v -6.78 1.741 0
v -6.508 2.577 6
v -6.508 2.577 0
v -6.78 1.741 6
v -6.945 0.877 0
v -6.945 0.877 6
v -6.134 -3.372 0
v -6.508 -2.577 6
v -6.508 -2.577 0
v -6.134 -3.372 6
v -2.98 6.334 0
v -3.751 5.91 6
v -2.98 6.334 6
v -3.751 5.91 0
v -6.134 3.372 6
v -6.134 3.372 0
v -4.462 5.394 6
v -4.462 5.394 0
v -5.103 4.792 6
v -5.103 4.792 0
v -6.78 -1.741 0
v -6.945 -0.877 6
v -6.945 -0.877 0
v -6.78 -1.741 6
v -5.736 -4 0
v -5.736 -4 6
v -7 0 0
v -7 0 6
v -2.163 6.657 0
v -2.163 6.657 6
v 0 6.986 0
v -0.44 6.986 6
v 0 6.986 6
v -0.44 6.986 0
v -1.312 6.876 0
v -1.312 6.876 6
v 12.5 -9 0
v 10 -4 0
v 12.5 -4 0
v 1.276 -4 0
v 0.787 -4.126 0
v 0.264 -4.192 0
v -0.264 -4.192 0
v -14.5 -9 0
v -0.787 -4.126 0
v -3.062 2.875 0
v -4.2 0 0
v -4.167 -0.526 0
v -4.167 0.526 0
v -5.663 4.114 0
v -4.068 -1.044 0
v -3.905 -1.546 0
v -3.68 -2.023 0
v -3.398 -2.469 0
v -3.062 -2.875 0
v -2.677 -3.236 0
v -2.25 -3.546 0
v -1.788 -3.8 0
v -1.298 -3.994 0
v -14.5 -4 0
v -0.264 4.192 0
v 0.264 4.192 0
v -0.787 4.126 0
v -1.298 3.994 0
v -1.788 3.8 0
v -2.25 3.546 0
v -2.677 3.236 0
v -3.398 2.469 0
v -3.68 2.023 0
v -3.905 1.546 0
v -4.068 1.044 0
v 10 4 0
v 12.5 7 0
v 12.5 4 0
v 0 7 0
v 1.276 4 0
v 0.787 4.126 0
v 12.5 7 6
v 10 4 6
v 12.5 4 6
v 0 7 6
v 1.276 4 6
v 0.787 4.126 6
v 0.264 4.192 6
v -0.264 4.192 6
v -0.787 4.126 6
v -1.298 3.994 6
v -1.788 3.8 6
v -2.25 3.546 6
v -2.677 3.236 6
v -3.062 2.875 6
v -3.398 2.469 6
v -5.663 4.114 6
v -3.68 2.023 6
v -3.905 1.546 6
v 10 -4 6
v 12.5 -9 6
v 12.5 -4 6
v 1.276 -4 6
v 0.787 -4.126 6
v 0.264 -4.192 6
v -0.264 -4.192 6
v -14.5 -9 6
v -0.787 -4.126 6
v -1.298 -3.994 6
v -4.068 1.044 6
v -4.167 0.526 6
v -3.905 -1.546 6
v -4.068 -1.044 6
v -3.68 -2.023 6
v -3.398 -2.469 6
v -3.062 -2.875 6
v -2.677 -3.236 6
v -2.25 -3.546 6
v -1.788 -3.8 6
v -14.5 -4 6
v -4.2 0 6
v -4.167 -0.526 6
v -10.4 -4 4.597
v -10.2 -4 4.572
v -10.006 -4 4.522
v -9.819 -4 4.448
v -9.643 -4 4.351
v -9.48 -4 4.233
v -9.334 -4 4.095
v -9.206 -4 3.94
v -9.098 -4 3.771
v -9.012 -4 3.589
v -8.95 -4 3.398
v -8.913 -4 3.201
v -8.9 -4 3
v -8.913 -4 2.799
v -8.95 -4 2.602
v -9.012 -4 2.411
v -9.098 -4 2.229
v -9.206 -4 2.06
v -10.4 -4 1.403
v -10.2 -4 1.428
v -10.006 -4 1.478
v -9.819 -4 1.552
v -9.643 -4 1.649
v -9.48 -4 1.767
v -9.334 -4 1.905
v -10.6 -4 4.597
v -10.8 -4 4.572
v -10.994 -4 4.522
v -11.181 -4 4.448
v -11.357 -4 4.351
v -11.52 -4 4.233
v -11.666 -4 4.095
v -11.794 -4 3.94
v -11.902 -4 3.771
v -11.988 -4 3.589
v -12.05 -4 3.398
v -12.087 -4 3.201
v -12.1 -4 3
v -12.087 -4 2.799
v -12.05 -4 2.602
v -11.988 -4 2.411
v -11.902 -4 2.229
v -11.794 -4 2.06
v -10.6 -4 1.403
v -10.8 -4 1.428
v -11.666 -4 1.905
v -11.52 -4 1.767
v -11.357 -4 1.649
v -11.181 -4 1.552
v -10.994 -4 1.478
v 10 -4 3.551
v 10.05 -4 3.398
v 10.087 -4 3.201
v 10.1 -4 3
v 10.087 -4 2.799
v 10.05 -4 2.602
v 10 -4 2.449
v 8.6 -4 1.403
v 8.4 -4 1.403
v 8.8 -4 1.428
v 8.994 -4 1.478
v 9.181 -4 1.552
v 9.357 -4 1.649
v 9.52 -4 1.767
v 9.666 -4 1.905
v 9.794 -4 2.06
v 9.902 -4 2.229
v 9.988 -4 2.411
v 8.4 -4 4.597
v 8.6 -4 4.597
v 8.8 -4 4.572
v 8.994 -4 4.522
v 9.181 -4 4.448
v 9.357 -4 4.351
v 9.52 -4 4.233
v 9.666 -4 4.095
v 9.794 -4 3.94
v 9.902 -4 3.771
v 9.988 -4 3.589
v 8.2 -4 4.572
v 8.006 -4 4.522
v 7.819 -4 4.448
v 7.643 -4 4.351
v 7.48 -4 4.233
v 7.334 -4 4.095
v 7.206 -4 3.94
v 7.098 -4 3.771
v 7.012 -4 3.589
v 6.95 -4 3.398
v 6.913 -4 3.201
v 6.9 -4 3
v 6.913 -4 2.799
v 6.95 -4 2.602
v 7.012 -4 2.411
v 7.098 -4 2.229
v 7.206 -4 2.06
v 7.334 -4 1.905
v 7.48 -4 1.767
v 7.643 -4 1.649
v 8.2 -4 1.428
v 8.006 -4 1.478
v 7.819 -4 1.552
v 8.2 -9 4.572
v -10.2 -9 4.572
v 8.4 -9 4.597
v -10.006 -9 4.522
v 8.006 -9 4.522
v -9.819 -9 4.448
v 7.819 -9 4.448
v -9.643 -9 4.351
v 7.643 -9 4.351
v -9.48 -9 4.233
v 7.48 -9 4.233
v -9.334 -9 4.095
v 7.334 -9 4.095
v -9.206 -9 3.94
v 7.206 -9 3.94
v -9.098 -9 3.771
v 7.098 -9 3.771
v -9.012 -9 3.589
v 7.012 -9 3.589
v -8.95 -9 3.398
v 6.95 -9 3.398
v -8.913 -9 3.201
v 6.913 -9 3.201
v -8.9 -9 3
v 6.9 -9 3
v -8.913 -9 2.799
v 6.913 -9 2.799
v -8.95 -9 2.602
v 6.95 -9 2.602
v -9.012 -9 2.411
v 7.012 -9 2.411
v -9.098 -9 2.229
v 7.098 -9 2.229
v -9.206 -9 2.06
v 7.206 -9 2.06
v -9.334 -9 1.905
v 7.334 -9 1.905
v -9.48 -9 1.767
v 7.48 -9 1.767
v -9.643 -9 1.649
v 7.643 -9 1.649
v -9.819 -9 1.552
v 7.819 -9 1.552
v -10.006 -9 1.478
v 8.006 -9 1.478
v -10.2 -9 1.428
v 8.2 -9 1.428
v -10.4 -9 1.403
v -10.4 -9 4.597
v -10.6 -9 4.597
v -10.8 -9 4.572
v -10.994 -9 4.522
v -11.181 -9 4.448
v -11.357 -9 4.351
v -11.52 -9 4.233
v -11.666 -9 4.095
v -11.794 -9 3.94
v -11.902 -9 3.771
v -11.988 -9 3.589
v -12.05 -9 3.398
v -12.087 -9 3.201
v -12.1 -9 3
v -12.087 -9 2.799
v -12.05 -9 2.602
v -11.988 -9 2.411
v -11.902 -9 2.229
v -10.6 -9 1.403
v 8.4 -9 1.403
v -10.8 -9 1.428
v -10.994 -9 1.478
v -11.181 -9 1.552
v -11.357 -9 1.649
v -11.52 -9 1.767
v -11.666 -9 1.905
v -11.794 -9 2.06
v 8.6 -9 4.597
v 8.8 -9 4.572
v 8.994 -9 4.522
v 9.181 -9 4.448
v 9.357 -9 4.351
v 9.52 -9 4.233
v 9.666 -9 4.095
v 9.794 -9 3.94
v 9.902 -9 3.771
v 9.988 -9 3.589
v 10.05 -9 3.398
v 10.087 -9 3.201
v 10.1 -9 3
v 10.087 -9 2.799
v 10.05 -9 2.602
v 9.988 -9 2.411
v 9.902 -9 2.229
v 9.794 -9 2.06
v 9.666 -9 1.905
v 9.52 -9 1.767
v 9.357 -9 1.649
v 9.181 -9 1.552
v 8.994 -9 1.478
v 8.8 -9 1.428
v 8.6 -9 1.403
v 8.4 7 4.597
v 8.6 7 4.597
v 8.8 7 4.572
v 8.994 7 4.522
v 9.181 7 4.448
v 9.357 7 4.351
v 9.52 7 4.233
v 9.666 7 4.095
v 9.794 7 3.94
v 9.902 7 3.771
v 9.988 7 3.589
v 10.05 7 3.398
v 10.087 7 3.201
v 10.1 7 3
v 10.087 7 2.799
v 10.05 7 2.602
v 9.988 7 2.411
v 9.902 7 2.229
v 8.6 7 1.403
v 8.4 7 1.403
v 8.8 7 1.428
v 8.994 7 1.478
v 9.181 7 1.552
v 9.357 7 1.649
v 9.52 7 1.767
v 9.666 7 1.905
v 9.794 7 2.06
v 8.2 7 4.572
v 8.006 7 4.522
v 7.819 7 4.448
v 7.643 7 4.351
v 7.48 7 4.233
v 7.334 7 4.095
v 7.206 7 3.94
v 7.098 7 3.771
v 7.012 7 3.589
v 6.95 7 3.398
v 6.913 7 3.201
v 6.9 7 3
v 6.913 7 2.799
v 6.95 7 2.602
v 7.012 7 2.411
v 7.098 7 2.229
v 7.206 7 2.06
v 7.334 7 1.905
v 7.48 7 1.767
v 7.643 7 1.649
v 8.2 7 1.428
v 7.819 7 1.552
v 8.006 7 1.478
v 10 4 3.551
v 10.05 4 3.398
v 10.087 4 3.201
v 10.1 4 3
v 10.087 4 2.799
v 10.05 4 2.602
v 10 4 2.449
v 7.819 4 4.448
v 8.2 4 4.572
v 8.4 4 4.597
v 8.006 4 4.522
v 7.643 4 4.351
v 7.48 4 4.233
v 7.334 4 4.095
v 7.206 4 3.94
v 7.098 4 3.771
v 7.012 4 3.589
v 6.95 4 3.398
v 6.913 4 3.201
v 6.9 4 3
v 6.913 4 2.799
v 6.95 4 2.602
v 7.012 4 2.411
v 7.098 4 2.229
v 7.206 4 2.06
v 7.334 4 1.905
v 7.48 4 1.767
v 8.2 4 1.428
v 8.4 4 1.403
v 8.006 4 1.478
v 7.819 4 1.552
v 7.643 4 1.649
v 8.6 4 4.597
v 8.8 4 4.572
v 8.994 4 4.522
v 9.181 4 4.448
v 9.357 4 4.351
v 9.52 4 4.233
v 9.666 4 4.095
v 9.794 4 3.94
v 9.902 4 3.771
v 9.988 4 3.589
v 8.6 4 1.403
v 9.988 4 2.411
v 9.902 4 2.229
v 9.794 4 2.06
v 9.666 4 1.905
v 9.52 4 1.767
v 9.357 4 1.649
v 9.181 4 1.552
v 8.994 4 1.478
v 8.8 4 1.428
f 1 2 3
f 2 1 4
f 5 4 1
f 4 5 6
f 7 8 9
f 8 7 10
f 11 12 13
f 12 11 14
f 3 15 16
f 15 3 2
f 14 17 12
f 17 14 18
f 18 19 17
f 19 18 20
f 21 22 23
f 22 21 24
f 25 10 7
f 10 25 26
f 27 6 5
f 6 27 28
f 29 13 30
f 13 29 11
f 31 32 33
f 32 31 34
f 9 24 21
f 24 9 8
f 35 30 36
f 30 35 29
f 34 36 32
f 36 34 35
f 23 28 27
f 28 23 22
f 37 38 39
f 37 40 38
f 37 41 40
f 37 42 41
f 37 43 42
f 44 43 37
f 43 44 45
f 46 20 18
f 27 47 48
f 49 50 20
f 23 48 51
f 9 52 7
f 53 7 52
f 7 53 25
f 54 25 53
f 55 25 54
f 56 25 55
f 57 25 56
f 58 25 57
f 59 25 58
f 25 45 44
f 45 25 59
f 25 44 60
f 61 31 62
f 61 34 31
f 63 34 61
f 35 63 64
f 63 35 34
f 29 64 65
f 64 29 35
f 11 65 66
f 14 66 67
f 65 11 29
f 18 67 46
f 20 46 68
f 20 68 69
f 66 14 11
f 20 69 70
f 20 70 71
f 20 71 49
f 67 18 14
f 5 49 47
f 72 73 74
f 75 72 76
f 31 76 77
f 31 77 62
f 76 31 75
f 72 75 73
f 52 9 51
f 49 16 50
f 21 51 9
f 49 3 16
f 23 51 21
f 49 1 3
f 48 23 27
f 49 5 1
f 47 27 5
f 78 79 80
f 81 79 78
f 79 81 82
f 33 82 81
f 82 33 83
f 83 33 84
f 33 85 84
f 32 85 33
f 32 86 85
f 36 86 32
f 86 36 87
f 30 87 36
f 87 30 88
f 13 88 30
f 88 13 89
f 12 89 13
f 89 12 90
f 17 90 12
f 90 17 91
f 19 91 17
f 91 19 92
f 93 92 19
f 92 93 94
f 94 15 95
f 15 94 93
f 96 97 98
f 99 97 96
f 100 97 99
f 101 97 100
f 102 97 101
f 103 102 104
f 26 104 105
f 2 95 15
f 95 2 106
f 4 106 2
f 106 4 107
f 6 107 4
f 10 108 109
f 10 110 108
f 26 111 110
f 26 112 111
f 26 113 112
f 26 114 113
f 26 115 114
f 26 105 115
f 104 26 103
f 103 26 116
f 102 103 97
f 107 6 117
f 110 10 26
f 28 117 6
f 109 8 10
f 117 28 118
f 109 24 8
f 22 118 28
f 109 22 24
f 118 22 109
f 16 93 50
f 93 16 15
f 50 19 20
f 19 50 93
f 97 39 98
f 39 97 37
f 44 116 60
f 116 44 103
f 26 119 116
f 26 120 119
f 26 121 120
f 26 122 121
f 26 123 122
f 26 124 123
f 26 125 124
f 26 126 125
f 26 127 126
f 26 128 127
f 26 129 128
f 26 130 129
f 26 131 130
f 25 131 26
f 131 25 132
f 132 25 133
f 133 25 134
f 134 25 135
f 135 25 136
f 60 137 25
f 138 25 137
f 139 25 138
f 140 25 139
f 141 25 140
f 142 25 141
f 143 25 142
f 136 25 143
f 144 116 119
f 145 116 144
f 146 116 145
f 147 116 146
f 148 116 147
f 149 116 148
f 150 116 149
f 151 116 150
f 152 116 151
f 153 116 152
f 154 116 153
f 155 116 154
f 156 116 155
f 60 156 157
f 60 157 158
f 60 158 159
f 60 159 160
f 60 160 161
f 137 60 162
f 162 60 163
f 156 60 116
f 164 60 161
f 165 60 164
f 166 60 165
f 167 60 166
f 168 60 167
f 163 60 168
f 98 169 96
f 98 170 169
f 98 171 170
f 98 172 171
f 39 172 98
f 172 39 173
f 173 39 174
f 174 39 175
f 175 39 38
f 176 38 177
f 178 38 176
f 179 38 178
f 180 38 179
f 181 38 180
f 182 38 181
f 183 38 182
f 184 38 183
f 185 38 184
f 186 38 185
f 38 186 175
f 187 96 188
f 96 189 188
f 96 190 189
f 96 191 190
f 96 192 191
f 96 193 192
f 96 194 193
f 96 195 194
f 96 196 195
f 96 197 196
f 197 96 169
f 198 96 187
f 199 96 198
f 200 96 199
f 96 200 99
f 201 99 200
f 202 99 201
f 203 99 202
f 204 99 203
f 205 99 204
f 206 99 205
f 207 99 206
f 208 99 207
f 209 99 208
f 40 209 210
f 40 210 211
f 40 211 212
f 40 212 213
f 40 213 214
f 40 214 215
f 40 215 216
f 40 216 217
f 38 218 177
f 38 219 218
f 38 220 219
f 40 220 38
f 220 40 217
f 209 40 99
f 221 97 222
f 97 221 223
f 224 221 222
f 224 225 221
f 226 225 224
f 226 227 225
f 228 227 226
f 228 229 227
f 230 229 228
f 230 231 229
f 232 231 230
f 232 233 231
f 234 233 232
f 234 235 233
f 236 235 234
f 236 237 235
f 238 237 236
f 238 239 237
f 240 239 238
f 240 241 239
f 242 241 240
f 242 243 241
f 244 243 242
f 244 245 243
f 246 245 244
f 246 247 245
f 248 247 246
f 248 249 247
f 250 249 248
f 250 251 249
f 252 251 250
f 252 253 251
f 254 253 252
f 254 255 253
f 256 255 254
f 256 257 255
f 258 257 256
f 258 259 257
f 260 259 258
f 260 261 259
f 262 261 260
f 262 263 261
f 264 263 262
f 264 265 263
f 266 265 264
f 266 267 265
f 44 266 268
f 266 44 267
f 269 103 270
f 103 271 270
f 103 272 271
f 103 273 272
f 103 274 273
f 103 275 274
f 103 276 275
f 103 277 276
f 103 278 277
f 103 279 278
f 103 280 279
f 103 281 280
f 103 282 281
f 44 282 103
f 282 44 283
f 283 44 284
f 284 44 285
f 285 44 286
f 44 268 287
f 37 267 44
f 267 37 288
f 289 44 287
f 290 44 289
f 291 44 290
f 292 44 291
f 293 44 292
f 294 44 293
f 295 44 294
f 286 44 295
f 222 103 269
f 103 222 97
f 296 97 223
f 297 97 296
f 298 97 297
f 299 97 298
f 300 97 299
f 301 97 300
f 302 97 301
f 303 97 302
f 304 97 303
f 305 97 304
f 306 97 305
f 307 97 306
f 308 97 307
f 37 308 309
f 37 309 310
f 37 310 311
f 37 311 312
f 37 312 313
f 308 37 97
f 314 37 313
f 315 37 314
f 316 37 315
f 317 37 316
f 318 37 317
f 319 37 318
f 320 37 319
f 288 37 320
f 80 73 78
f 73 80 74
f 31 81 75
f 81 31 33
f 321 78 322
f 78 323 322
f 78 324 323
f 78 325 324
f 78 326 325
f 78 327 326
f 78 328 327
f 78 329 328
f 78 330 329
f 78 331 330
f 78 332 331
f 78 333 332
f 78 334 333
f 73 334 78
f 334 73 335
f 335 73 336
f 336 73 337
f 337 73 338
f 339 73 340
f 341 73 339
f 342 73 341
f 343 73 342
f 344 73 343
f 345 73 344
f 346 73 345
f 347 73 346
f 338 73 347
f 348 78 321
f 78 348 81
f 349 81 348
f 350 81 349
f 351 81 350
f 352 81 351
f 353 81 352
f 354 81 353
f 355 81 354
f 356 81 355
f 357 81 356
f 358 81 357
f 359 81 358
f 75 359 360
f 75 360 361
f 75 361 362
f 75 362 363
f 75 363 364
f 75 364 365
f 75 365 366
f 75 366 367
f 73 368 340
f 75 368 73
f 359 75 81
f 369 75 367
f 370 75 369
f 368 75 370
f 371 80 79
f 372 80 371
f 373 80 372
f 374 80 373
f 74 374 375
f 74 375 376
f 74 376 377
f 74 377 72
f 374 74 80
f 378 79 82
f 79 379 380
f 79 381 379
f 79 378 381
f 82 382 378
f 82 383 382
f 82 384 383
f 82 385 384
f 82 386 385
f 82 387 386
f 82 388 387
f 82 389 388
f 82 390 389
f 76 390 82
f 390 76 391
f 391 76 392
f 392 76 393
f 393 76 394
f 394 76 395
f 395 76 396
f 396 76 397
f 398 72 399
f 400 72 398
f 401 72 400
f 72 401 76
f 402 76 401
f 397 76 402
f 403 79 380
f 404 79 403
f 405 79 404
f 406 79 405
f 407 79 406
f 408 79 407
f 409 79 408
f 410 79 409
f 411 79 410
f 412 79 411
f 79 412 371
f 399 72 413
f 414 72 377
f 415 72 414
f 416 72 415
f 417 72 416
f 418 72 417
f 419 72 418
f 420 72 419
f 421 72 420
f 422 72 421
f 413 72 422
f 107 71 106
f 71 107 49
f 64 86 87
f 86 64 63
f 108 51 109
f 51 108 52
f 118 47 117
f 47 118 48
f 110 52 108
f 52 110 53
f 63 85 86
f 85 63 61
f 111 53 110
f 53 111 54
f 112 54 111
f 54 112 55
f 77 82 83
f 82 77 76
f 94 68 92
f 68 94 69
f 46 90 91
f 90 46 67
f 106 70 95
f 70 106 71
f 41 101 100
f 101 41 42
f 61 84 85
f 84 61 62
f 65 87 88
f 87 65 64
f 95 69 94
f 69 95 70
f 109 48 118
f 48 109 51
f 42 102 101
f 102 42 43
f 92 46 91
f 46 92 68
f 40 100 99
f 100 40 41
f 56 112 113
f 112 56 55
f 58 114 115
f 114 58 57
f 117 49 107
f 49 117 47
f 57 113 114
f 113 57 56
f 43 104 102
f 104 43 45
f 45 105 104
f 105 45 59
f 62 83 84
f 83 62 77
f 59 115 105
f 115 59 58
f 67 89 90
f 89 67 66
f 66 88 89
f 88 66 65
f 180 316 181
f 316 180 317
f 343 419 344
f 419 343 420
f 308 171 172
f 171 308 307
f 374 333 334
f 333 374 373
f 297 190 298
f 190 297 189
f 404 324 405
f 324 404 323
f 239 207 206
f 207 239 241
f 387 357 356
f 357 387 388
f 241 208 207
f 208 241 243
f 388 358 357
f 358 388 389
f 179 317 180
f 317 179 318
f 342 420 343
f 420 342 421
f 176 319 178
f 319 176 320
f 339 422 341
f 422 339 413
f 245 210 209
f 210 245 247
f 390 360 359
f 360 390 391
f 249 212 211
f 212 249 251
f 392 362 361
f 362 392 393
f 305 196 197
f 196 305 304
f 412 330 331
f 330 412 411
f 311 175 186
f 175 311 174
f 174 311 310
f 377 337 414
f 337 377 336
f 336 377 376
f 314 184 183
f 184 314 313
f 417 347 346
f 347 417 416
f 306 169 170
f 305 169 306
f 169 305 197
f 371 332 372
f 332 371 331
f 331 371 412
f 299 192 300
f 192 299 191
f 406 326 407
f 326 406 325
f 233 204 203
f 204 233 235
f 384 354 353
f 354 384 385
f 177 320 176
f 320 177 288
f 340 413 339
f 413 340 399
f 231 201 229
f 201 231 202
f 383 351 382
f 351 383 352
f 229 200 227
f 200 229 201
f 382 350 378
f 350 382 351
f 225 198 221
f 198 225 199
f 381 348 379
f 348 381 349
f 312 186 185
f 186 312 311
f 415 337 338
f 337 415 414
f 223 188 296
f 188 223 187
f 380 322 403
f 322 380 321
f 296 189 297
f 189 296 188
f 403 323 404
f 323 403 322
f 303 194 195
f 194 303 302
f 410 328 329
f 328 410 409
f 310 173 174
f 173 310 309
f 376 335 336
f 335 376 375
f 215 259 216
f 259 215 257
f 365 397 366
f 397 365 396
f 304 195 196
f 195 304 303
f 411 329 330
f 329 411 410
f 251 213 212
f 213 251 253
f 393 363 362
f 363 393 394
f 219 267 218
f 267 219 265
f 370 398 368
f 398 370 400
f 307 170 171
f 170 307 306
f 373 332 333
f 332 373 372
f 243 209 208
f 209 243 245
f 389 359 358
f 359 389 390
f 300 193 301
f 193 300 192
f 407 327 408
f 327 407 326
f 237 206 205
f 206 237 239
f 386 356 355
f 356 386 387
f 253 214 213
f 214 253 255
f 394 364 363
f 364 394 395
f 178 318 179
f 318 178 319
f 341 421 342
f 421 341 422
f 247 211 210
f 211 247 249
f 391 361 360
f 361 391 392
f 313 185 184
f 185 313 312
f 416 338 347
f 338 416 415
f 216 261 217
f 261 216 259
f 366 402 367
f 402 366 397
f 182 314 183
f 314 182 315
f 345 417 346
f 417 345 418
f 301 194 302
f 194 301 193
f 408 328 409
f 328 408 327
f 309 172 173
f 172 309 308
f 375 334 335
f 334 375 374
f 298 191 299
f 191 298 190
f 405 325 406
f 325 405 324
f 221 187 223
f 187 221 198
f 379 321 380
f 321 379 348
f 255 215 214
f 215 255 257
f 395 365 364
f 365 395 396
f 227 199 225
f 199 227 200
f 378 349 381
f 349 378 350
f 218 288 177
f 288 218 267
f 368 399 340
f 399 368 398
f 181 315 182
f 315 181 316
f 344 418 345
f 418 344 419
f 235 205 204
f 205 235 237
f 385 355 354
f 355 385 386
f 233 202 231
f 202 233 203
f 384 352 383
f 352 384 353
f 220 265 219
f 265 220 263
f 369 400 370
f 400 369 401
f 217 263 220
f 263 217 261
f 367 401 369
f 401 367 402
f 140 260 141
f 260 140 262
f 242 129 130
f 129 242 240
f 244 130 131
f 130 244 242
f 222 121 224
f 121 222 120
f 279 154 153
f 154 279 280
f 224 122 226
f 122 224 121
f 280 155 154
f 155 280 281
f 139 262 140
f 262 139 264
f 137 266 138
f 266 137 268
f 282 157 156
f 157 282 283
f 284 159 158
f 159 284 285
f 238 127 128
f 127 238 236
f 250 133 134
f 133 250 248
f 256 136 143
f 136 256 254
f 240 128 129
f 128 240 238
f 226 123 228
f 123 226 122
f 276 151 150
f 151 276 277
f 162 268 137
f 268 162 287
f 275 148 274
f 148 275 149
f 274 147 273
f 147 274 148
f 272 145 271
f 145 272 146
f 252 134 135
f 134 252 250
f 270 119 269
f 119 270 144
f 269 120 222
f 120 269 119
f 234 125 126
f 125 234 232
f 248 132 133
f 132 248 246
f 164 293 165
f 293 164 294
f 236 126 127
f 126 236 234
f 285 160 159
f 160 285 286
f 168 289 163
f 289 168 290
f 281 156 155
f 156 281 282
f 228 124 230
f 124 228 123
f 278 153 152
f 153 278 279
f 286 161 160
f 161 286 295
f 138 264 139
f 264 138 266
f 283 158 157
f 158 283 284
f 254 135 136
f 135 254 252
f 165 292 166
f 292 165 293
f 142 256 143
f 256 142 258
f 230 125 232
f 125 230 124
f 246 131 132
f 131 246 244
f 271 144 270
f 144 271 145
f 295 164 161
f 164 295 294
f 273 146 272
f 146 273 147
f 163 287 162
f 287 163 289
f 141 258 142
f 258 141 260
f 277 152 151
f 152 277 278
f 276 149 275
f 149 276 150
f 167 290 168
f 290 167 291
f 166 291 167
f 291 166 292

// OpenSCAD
$fn=50;

module mod1() {
	difference () {
		union() {
			cylinder (r=7, h=6 );
			translate ([-14.5,-9,0]) cube ([27,5,6]);
			translate ([0,4,0]) cube([12.5,3,6]);	
		}
		cylinder (r=4.2, h=6 );
		translate([0,-4,0]) cube([10,8,6]);
		translate ([8.5,10,3]) rotate ([90,0,0]) cylinder (r=1.6, h=20);
		translate ([-10.5,-3,3]) rotate ([90,0,0]) cylinder (r=1.6, h=20);
	}

}

mod1();
